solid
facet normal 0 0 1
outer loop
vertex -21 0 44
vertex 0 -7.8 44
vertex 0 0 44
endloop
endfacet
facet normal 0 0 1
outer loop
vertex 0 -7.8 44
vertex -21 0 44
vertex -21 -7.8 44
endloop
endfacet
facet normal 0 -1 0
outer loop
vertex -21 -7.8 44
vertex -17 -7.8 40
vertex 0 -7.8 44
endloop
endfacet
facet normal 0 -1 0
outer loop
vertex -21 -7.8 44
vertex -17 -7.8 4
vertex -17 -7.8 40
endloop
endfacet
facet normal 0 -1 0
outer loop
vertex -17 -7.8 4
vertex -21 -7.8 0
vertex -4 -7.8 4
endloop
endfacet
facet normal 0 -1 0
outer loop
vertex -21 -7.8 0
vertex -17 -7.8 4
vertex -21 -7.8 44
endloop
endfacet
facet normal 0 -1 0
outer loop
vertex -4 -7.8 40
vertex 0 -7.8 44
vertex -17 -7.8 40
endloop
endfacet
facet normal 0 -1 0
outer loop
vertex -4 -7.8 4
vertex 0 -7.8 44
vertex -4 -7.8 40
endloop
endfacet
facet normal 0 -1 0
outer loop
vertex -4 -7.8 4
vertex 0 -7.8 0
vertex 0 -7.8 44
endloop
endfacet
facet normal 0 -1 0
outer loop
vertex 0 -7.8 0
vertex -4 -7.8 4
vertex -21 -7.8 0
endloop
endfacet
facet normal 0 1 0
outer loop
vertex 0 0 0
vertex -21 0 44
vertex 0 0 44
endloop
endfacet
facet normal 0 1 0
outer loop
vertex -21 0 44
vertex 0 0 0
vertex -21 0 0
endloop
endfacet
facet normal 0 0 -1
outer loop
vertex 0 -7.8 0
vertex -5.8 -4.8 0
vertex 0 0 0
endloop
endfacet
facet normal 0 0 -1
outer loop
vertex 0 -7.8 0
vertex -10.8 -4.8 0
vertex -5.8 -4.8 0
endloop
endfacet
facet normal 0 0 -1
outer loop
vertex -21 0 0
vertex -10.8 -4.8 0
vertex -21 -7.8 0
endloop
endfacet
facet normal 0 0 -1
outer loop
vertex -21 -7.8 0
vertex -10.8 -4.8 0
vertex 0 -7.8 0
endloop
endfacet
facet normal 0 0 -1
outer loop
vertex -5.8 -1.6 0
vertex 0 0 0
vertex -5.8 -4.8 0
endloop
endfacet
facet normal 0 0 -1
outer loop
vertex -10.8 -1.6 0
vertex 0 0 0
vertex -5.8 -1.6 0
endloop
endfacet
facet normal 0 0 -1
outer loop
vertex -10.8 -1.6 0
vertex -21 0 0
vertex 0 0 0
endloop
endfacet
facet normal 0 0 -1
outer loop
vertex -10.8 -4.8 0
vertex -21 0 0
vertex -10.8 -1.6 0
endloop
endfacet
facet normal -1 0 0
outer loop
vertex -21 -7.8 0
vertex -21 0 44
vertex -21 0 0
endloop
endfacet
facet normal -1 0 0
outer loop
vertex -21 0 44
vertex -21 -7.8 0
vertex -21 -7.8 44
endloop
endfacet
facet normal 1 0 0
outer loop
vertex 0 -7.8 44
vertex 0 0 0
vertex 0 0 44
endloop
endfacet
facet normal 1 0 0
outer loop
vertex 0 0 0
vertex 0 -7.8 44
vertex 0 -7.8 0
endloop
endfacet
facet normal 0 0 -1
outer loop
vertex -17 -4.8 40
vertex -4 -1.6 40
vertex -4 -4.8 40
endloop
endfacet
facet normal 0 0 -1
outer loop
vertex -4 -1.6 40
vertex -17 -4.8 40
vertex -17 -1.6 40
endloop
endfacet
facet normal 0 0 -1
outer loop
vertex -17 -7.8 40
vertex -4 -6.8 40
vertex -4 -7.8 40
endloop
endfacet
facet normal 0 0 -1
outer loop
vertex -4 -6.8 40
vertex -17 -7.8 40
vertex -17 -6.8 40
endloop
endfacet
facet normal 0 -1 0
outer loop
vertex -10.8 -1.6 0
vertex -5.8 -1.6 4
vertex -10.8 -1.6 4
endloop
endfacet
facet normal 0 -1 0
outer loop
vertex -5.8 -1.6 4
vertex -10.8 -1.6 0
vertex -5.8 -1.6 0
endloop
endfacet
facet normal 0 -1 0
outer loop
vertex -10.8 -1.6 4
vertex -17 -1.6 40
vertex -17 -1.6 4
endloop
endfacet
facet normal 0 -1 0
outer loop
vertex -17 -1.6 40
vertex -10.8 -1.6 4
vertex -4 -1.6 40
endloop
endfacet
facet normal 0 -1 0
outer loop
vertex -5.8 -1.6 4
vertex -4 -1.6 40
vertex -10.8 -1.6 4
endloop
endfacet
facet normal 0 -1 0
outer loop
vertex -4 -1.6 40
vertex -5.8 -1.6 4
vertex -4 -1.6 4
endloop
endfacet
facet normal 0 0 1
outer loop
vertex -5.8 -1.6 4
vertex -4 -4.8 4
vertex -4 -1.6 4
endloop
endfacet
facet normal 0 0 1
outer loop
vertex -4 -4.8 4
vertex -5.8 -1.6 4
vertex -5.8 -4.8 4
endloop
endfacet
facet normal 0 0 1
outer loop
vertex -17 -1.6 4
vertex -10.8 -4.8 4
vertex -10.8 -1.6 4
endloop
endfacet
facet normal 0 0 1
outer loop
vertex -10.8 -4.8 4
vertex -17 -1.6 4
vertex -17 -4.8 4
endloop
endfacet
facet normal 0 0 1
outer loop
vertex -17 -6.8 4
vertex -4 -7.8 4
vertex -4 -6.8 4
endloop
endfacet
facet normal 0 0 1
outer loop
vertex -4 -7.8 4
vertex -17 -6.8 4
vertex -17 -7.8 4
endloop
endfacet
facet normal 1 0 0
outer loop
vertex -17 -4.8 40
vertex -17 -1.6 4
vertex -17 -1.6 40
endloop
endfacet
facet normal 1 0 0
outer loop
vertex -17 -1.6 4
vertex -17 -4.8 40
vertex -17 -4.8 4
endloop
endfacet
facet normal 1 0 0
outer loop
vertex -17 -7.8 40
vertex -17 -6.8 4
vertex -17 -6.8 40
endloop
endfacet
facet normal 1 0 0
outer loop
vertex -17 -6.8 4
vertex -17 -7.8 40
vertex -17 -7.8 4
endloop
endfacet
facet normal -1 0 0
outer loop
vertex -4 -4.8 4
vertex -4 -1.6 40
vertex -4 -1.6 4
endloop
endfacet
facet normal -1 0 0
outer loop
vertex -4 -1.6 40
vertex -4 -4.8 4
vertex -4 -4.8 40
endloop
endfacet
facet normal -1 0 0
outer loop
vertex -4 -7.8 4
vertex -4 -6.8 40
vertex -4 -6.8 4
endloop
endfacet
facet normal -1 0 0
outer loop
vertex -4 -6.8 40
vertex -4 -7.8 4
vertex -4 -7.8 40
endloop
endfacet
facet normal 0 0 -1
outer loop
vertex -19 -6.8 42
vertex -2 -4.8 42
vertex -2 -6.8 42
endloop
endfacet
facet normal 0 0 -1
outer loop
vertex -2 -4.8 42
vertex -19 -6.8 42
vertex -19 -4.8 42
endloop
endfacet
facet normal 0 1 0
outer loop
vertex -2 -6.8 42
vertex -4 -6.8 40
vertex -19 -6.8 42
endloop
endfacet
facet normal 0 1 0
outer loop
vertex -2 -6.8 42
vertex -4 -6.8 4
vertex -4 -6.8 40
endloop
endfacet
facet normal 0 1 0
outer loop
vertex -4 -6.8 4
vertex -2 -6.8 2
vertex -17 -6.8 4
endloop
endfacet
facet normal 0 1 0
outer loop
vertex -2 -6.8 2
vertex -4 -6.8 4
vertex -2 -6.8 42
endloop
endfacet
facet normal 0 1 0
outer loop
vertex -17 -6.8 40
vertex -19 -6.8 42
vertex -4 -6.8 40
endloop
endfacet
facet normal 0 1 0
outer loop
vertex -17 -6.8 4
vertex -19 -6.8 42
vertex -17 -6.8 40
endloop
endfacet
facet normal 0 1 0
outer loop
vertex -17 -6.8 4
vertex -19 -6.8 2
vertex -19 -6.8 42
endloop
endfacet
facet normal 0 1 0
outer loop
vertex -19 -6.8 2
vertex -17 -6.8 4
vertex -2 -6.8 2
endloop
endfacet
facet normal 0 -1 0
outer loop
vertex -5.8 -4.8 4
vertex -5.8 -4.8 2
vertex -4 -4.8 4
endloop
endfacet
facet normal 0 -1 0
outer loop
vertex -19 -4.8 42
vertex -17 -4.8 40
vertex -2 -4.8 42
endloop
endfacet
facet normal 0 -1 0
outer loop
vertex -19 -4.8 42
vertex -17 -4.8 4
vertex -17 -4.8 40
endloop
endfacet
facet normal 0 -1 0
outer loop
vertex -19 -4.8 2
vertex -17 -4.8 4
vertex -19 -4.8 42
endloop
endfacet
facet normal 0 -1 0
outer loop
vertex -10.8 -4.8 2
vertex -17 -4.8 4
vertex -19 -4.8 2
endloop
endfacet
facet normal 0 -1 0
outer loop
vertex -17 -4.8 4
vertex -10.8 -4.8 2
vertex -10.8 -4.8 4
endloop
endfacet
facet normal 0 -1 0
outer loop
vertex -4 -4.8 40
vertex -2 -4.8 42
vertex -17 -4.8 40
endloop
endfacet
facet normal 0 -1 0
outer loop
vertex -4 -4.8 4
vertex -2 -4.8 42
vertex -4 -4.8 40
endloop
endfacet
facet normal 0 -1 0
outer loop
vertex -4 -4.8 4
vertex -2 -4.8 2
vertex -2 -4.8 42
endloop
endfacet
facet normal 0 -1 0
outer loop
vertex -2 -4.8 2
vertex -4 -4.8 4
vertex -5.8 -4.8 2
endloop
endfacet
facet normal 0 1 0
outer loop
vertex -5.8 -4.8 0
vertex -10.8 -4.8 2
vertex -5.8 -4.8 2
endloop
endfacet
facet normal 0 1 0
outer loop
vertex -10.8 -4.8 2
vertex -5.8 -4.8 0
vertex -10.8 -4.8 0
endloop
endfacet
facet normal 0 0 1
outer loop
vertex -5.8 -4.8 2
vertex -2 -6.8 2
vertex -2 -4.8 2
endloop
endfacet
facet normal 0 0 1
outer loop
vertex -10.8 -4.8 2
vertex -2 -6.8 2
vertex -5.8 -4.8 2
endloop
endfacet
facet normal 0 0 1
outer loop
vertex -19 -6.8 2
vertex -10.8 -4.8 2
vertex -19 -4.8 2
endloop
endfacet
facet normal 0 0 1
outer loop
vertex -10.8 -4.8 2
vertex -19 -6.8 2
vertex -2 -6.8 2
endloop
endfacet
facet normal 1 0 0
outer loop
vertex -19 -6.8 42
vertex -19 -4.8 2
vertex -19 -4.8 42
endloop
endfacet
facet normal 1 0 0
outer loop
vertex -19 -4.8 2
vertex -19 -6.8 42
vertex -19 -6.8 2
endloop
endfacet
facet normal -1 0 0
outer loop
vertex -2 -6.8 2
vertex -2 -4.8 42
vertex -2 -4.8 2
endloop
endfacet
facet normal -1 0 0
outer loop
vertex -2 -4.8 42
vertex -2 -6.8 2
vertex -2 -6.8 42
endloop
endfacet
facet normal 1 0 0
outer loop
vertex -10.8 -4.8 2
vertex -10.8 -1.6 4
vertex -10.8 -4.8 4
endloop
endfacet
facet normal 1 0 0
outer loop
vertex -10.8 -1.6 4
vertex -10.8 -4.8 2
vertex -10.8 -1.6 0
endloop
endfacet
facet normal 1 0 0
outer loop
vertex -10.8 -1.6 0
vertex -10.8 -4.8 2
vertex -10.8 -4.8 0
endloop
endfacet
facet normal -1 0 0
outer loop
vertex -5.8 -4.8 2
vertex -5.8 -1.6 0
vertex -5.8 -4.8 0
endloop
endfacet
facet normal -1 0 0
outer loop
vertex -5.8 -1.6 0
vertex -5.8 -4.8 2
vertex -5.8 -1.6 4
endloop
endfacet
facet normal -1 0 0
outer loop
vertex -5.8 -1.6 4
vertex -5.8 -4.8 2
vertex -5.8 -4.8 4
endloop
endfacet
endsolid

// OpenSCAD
width = 17;
length = 40;
walls = 2;
bottom = 1.6;
spacing = 3.2;
boardHeight = 2;
top = 1;
cutoutDepth = 2;

wireCutoutOffset = 3.8;
wireCutout = 5;

/* [Hidden] */
totalHeight = bottom + spacing + boardHeight + top;
totalLength = length + (walls) * 2;
totalWidth = width + (walls) * 2;

rotate([0, -90, 90])
difference() {
  cube([totalLength, totalWidth, totalHeight]);
  
  translate([walls + cutoutDepth, walls + cutoutDepth, bottom])
    cube([length - cutoutDepth * 2, width - cutoutDepth * 2, totalHeight]);
  
  translate([walls, walls, bottom + spacing])
    cube([length, width, boardHeight]);
  translate([-1, wireCutoutOffset + walls, bottom])
    cube([walls + cutoutDepth + 2, wireCutout, spacing]);
}
